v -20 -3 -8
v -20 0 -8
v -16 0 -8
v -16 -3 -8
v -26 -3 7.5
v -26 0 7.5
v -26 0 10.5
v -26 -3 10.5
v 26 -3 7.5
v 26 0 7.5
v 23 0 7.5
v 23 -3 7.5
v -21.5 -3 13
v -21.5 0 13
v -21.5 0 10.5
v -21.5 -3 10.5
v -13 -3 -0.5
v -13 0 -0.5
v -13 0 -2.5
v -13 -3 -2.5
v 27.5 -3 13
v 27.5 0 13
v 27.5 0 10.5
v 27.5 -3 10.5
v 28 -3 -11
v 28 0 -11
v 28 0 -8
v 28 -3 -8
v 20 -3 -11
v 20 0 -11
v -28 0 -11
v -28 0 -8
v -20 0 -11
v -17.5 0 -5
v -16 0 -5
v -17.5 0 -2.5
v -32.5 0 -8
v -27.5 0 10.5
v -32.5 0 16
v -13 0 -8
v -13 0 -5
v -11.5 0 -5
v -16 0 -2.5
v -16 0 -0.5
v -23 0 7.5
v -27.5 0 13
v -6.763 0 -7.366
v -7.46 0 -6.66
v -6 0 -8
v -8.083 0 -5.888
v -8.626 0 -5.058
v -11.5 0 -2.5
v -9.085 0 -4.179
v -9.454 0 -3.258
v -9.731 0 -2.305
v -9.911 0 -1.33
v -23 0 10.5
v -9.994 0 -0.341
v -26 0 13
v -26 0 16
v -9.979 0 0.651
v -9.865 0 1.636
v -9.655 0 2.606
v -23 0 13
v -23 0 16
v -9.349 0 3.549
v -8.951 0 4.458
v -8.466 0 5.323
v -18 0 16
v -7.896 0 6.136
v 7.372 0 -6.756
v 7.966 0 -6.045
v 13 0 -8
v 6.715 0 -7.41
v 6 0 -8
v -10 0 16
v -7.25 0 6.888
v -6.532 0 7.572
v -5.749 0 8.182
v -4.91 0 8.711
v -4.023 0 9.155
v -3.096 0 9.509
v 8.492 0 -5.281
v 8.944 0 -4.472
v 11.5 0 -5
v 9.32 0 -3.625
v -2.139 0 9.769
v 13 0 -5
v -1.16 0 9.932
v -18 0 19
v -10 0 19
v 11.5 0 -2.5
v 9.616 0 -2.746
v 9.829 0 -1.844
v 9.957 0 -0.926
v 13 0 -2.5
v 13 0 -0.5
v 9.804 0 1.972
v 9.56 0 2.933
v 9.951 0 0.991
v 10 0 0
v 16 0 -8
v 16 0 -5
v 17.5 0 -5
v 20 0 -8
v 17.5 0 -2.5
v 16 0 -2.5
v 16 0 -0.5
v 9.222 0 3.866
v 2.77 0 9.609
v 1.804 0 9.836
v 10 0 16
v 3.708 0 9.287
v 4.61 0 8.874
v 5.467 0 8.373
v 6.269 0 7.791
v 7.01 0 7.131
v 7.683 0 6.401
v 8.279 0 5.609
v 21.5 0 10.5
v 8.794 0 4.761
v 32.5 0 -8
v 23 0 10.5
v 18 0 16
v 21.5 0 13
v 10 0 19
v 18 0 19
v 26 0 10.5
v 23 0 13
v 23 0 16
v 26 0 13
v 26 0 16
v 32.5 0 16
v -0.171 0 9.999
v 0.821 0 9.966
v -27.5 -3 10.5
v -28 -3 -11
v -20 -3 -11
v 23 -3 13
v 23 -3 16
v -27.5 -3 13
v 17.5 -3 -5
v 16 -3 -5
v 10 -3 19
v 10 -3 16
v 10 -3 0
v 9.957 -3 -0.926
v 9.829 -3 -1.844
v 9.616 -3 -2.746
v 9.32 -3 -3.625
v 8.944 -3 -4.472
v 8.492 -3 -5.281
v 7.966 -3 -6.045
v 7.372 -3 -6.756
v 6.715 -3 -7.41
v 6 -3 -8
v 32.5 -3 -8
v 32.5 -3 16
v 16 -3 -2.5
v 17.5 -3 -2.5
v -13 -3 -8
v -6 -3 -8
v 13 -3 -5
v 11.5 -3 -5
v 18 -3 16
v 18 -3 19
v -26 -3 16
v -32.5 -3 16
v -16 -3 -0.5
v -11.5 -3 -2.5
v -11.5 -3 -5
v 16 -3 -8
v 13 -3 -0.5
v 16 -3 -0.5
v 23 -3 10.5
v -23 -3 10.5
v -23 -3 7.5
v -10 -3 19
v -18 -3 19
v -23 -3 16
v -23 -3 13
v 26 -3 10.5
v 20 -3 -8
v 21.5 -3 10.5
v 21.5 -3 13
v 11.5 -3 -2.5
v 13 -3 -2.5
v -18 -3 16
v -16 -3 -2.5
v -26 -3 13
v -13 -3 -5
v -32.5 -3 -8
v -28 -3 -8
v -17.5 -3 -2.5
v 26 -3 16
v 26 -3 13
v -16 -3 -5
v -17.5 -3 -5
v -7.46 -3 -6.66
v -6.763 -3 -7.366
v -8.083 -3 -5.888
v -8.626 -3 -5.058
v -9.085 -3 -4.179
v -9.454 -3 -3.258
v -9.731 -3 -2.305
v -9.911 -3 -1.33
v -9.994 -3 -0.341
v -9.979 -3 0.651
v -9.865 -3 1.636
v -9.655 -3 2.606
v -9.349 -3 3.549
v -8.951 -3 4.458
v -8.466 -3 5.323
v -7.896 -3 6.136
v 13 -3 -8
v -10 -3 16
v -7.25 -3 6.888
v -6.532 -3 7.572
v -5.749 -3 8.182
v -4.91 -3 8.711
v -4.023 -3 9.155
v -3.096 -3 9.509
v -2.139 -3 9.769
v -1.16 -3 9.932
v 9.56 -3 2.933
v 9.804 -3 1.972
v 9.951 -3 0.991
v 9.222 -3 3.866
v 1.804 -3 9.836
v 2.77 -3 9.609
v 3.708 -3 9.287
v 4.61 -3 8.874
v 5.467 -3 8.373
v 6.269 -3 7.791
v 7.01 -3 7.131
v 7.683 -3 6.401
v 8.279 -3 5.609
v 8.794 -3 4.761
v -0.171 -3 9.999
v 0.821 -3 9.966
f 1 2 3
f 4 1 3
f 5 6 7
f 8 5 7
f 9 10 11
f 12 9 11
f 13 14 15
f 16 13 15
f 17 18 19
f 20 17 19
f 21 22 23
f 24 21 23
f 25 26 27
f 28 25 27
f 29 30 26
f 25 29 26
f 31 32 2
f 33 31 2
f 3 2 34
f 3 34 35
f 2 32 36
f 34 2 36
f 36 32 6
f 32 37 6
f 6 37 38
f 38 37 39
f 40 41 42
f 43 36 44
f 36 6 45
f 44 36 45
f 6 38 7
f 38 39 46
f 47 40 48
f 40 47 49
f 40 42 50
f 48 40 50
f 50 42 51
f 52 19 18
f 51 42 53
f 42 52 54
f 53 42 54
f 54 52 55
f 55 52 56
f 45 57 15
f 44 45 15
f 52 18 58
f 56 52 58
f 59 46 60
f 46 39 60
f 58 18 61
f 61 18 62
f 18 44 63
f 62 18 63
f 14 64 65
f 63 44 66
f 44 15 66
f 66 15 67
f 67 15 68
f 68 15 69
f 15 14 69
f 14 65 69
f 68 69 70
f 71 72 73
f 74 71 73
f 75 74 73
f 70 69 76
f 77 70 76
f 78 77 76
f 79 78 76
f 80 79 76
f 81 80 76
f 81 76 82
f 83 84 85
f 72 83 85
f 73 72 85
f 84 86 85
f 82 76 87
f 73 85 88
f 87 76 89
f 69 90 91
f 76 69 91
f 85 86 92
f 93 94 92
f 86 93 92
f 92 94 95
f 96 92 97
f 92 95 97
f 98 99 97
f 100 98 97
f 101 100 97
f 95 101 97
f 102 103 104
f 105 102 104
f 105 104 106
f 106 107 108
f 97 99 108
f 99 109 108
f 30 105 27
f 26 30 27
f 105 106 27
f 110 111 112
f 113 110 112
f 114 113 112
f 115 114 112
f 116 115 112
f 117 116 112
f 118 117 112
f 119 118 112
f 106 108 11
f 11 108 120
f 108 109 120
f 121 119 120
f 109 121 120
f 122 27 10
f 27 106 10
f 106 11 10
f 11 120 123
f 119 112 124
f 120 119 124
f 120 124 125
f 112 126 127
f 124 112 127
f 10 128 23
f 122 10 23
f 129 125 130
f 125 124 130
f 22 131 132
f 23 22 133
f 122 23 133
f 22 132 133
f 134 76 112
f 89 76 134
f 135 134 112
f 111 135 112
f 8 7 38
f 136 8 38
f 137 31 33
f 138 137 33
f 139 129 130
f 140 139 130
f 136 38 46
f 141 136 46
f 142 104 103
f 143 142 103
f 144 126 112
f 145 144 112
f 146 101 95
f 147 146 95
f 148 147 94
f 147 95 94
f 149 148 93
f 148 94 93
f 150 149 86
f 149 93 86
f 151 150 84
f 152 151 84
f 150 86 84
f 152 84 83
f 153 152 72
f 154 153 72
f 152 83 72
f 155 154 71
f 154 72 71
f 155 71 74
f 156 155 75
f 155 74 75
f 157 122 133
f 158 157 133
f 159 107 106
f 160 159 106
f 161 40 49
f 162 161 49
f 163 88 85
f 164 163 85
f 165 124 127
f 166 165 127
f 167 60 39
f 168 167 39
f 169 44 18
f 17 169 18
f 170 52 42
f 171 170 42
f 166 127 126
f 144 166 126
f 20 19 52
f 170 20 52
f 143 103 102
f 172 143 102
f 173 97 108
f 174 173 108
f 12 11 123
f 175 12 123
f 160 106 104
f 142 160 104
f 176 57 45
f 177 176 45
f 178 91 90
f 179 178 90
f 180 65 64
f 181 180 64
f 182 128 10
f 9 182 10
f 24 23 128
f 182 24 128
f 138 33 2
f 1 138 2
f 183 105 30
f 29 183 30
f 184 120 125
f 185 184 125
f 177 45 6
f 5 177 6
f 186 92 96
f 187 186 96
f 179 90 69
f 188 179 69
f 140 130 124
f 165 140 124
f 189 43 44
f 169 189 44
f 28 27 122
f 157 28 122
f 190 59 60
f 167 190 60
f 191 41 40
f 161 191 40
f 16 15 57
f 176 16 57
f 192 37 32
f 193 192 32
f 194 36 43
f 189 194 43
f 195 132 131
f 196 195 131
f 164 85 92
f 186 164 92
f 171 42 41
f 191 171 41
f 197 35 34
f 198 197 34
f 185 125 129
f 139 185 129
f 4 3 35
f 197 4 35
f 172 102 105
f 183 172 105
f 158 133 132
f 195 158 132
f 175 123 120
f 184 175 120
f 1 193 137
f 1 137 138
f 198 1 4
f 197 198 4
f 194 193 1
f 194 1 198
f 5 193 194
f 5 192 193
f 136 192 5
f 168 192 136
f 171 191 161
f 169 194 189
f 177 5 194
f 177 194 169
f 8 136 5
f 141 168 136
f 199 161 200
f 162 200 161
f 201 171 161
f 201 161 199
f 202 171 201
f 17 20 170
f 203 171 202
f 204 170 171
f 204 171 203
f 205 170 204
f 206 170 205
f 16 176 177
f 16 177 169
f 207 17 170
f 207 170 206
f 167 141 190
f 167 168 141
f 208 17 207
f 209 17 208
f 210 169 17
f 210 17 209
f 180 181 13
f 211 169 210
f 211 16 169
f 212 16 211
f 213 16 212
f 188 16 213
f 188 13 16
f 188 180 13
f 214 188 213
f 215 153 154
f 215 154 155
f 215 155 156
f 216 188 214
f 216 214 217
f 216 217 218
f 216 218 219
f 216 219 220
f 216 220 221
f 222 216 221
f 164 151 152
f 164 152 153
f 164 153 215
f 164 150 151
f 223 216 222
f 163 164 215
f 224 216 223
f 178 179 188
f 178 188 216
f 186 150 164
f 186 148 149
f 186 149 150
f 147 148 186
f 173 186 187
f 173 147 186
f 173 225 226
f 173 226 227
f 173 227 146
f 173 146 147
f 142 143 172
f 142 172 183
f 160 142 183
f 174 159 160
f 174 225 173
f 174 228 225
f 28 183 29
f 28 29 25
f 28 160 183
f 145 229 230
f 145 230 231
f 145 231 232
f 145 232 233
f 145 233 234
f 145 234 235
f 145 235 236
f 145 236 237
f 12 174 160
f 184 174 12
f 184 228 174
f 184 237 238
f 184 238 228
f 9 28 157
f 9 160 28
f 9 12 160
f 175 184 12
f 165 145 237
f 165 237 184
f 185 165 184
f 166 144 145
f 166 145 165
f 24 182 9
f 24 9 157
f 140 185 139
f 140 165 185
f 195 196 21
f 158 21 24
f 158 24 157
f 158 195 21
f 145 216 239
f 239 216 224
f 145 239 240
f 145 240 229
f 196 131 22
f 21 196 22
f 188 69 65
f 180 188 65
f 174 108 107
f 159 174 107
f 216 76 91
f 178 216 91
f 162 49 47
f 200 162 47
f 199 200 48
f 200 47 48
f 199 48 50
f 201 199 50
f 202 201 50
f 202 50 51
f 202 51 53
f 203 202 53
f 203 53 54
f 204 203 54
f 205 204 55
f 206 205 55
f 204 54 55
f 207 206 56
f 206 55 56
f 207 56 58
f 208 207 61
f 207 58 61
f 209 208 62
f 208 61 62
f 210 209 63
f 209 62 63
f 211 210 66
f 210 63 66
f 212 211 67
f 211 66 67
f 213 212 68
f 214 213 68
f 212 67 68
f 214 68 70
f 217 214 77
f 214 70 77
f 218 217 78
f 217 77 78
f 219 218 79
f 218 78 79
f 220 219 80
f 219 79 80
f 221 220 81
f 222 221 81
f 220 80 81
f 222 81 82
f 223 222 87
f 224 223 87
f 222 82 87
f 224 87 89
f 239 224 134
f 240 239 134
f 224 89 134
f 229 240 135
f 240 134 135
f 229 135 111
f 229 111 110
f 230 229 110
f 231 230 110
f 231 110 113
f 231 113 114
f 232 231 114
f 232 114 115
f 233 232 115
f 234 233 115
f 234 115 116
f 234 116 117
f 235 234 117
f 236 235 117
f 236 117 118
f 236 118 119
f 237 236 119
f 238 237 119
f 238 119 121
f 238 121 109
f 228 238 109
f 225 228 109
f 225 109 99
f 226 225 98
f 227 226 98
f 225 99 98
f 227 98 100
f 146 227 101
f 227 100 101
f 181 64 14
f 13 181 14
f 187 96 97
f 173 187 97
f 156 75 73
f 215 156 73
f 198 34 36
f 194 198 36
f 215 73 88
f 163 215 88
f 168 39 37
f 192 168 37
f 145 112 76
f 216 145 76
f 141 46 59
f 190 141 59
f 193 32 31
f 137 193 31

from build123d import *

# Parameters (mm, degrees)
F1_DEPTH = 3
F3_DEPTH = 3


with BuildPart() as f1:
    # F0 (on Front) → F1 (new body)
    with BuildSketch(Plane.XZ):
        with BuildLine():
            Line((28, -8), (32.5, -8))
            Line((32.5, -8), (32.5, 16))
            Line((32.5, 16), (18, 16))
            Line((18, 16), (18, 19))
            Line((18, 19), (10, 19))
            Line((10, 19), (10, 16))
            Line((10, 16), (0, 16))
            Line((0, 16), (-10, 16))
            Line((-10, 16), (-10, 19))
            Line((-10, 19), (-18, 19))
            Line((-18, 19), (-18, 16))
            Line((-18, 16), (-32.5, 16))
            Line((-32.5, 16), (-32.5, -8))
            Line((-32.5, -8), (-28, -8))
            Line((-28, -8), (-28, -11))
            Line((-28, -11), (-20, -11))
            Line((-20, -11), (-20, -8))
            Line((-20, -8), (-6, -8))
            ThreePointArc((-6, -8), (-4.472136, 8.944272), (10, 0))
            ThreePointArc((10, 0), (8.944272, -4.472136), (6, -8))
            Line((6, -8), (20, -8))
            Line((20, -8), (20, -11))
            Line((20, -11), (28, -11))
            Line((28, -11), (28, -8))
        make_face()
    extrude(amount=F1_DEPTH)

    # F2 (on face) → F3 (cut, through all)
    with BuildSketch(Plane(origin=(0, 0, 0), x_dir=(-1, 0, 0), z_dir=(0, 1, 0))):
        Polygon((13, -5), (13, -8), (16, -8), (16, -5), (17.5, -5), (17.5, -2.5), (16, -2.5), (16, -0.5), (13, -0.5), (13, -2.5), (11.5, -2.5), (11.5, -5), align=None)
        Polygon((-11.5, -2.5), (-13, -2.5), (-13, -0.5), (-16, -0.5), (-16, -2.5), (-17.5, -2.5), (-17.5, -5), (-16, -5), (-16, -8), (-13, -8), (-13, -5), (-11.5, -5), align=None)
        Polygon((26, 13), (26, 16), (23, 16), (23, 13), (21.5, 13), (21.5, 10.5), (23, 10.5), (23, 7.5), (26, 7.5), (26, 10.5), (27.5, 10.5), (27.5, 13), align=None)
        Polygon((-23, 10.5), (-21.5, 10.5), (-21.5, 13), (-23, 13), (-23, 16), (-26, 16), (-26, 13), (-27.5, 13), (-27.5, 10.5), (-26, 10.5), (-26, 7.5), (-23, 7.5), align=None)
    extrude(amount=-F3_DEPTH, mode=Mode.SUBTRACT)


solid = f1.part
